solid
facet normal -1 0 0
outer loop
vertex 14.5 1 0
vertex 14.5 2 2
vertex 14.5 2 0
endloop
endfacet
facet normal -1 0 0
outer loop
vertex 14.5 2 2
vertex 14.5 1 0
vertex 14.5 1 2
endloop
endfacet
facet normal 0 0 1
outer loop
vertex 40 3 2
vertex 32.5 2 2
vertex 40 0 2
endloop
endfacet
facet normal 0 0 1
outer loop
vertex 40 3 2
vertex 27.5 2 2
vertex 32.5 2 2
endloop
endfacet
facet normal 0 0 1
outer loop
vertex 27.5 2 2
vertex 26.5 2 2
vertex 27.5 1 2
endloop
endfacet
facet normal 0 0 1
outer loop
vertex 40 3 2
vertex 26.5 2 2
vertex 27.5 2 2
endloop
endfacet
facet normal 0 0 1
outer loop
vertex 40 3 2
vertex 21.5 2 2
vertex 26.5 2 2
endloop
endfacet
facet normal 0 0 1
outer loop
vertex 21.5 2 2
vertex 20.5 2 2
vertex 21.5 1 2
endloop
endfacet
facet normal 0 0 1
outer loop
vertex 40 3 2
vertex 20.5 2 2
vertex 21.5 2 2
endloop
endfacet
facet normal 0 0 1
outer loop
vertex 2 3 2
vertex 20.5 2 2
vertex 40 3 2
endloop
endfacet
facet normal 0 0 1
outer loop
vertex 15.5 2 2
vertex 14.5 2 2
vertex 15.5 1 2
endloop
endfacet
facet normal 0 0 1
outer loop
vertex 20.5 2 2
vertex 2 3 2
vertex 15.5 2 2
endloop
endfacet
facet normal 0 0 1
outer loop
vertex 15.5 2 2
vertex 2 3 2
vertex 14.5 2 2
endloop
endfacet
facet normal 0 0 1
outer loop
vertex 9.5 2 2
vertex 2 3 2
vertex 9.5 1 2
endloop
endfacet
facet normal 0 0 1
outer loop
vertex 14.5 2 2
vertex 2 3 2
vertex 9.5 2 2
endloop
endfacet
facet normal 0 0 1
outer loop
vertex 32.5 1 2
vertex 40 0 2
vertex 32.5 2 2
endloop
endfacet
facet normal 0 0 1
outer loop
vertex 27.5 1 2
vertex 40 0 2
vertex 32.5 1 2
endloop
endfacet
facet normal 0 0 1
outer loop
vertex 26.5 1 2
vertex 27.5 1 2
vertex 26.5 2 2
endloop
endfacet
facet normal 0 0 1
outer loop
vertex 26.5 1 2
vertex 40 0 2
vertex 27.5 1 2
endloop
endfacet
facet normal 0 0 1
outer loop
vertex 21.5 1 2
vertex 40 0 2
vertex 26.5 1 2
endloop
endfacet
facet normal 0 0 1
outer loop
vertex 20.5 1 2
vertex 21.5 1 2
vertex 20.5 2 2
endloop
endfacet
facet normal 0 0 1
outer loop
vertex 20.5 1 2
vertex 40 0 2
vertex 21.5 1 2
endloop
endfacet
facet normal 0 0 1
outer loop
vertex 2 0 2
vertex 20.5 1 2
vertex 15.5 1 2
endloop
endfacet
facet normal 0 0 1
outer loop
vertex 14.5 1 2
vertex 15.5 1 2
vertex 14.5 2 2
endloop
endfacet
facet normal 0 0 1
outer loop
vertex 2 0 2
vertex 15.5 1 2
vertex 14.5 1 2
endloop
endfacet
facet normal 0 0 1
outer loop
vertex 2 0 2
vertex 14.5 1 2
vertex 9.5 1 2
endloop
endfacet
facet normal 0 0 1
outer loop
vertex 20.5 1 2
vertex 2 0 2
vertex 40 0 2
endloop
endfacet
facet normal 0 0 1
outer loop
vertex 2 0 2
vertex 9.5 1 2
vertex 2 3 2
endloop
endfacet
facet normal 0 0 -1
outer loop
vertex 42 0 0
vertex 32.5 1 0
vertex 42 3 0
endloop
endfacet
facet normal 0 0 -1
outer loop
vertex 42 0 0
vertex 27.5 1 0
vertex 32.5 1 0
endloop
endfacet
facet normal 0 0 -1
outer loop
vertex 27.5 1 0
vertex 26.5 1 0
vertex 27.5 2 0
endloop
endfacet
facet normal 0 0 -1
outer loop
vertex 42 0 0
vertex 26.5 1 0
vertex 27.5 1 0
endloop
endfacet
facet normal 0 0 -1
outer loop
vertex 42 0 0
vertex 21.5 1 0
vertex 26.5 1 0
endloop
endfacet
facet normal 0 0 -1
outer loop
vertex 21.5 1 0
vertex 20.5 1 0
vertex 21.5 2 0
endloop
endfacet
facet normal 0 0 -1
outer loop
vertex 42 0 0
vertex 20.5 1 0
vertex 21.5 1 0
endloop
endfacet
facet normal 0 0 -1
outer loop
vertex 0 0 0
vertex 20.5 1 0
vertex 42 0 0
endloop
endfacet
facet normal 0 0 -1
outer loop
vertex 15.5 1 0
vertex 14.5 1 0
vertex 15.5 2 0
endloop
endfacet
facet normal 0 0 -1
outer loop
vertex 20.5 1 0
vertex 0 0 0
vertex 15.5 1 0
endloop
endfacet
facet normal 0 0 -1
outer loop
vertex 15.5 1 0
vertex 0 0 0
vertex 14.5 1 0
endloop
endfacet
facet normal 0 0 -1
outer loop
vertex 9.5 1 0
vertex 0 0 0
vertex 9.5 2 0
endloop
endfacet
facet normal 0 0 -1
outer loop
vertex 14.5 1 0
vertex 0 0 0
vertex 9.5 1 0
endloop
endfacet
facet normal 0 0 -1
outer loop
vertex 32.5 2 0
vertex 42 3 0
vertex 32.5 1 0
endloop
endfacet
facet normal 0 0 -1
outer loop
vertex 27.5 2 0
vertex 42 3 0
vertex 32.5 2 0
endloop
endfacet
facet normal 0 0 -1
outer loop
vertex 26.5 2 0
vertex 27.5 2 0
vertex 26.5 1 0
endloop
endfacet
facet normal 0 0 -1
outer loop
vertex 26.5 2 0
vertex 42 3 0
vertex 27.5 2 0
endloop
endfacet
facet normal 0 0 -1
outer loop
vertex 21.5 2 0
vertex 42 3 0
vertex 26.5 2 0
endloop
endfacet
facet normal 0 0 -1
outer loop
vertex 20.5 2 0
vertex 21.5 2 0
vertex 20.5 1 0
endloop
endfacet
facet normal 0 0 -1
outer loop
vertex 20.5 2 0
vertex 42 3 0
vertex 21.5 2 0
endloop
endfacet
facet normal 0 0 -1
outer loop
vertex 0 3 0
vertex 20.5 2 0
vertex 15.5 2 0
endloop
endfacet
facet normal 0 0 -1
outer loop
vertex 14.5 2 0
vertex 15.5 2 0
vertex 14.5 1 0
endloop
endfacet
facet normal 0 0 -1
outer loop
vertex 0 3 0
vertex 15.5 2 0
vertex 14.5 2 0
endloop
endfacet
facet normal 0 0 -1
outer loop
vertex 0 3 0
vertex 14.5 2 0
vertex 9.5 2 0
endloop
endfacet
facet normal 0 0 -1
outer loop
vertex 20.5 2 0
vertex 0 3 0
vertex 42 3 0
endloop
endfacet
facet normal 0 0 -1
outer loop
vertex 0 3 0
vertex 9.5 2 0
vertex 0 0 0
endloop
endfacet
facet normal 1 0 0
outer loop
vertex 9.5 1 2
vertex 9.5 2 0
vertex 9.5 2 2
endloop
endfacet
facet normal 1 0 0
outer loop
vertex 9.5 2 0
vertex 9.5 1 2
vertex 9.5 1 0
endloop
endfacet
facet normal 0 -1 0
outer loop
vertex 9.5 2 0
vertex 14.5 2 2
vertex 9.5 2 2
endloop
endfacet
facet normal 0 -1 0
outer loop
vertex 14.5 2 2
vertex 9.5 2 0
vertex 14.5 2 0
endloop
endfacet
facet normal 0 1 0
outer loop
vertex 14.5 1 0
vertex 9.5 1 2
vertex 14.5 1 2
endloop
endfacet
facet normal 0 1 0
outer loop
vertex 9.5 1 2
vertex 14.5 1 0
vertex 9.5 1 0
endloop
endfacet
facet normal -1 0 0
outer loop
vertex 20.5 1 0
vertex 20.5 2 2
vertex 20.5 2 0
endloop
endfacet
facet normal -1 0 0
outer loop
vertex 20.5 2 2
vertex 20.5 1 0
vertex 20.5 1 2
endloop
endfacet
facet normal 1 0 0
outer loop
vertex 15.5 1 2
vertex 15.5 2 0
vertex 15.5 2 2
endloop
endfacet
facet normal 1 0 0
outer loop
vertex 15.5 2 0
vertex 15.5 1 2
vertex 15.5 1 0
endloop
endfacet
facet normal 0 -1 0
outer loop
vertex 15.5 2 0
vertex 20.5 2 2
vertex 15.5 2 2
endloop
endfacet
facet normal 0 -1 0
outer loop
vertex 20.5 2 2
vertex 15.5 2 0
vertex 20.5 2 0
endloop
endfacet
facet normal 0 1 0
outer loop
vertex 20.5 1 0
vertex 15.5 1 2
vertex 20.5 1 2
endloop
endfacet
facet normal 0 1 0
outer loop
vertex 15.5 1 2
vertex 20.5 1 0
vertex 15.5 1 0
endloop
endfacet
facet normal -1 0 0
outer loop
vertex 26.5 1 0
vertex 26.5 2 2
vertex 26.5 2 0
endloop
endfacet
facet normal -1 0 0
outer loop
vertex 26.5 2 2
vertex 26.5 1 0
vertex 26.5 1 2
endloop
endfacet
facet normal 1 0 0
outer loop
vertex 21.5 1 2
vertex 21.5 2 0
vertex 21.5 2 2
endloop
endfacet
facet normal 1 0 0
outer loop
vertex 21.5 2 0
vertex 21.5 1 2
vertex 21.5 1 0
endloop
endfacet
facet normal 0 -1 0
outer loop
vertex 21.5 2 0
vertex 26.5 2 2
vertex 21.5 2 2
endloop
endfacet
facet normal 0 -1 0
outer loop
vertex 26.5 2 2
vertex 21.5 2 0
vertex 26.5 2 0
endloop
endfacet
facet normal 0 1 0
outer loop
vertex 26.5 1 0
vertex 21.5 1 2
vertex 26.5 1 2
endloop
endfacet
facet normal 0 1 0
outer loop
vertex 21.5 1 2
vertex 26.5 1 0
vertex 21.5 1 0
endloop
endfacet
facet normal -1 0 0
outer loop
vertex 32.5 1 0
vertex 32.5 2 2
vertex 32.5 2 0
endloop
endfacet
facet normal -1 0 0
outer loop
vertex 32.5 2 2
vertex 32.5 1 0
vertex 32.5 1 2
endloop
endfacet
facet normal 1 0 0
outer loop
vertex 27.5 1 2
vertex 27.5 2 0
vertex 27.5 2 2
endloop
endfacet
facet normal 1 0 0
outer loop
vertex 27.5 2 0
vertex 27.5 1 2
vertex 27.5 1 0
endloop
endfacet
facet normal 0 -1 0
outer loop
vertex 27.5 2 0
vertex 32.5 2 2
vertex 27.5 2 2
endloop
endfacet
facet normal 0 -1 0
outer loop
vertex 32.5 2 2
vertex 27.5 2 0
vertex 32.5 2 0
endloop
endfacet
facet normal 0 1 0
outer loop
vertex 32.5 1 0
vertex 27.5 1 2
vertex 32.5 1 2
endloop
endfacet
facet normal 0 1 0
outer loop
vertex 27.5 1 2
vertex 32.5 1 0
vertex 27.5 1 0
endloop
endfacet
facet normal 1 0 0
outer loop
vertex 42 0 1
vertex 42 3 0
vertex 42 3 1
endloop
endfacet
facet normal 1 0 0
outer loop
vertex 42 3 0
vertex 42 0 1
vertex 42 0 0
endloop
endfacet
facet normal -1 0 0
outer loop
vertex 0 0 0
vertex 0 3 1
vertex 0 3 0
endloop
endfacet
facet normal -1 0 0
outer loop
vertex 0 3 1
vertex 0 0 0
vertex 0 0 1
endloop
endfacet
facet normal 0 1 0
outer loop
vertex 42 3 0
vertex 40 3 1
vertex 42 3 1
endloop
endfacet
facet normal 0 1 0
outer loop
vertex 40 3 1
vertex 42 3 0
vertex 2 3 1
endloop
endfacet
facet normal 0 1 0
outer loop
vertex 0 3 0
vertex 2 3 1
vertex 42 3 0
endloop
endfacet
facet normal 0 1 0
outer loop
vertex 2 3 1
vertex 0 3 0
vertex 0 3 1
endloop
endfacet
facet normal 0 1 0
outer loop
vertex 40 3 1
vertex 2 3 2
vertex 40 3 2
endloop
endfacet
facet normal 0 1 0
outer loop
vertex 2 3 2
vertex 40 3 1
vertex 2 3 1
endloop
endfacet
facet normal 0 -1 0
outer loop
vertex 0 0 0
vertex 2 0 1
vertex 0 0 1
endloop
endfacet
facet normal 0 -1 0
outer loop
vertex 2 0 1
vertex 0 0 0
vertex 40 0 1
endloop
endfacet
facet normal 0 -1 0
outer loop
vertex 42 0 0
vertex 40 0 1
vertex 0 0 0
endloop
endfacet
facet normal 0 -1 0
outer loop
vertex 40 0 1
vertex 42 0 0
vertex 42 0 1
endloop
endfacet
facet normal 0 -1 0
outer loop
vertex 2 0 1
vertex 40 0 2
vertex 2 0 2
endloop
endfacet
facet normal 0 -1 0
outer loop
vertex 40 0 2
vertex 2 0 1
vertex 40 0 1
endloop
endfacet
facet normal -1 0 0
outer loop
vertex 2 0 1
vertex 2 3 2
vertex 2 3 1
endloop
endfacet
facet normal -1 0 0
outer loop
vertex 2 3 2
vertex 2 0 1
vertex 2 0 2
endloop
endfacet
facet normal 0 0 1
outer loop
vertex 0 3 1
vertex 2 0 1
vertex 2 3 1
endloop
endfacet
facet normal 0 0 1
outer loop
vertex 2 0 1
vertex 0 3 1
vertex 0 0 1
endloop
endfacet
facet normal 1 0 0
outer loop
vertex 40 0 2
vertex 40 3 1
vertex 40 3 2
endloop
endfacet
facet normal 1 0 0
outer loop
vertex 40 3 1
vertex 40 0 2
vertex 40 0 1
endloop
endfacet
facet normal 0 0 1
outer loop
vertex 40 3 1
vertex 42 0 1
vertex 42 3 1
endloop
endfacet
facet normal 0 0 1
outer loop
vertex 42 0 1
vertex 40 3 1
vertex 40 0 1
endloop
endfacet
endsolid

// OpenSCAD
distanceBetweenRings = 36;
insetLength = 1;
insetWidth = 3;

width = 3;
overlap = 2;


lowerOverLength = distanceBetweenRings + 2 * insetLength;
overLength = lowerOverLength + 2 * overlap;



workableSpace = overLength - overlap - insetLength - 4;

holeLength = 5;
unitLength = holeLength + 1;
numberOfHoles = (workableSpace / unitLength) - 1;

startingPoint = (overLength - workableSpace) / 2;

difference() {
    cube([overLength, width, 2]);
    negative();

    translate([lowerOverLength + overlap + insetLength + 1, width,0]) 
    rotate([0,0,180]) 
        negative();

for (i=[1:numberOfHoles])  {
	#translate([startingPoint + (i * unitLength),1,0]) cube([holeLength,1,2]);
}


}






module negative() {
    union() {
        translate([0, 0,1]) cube([overlap, width, 1]);
    }
}
